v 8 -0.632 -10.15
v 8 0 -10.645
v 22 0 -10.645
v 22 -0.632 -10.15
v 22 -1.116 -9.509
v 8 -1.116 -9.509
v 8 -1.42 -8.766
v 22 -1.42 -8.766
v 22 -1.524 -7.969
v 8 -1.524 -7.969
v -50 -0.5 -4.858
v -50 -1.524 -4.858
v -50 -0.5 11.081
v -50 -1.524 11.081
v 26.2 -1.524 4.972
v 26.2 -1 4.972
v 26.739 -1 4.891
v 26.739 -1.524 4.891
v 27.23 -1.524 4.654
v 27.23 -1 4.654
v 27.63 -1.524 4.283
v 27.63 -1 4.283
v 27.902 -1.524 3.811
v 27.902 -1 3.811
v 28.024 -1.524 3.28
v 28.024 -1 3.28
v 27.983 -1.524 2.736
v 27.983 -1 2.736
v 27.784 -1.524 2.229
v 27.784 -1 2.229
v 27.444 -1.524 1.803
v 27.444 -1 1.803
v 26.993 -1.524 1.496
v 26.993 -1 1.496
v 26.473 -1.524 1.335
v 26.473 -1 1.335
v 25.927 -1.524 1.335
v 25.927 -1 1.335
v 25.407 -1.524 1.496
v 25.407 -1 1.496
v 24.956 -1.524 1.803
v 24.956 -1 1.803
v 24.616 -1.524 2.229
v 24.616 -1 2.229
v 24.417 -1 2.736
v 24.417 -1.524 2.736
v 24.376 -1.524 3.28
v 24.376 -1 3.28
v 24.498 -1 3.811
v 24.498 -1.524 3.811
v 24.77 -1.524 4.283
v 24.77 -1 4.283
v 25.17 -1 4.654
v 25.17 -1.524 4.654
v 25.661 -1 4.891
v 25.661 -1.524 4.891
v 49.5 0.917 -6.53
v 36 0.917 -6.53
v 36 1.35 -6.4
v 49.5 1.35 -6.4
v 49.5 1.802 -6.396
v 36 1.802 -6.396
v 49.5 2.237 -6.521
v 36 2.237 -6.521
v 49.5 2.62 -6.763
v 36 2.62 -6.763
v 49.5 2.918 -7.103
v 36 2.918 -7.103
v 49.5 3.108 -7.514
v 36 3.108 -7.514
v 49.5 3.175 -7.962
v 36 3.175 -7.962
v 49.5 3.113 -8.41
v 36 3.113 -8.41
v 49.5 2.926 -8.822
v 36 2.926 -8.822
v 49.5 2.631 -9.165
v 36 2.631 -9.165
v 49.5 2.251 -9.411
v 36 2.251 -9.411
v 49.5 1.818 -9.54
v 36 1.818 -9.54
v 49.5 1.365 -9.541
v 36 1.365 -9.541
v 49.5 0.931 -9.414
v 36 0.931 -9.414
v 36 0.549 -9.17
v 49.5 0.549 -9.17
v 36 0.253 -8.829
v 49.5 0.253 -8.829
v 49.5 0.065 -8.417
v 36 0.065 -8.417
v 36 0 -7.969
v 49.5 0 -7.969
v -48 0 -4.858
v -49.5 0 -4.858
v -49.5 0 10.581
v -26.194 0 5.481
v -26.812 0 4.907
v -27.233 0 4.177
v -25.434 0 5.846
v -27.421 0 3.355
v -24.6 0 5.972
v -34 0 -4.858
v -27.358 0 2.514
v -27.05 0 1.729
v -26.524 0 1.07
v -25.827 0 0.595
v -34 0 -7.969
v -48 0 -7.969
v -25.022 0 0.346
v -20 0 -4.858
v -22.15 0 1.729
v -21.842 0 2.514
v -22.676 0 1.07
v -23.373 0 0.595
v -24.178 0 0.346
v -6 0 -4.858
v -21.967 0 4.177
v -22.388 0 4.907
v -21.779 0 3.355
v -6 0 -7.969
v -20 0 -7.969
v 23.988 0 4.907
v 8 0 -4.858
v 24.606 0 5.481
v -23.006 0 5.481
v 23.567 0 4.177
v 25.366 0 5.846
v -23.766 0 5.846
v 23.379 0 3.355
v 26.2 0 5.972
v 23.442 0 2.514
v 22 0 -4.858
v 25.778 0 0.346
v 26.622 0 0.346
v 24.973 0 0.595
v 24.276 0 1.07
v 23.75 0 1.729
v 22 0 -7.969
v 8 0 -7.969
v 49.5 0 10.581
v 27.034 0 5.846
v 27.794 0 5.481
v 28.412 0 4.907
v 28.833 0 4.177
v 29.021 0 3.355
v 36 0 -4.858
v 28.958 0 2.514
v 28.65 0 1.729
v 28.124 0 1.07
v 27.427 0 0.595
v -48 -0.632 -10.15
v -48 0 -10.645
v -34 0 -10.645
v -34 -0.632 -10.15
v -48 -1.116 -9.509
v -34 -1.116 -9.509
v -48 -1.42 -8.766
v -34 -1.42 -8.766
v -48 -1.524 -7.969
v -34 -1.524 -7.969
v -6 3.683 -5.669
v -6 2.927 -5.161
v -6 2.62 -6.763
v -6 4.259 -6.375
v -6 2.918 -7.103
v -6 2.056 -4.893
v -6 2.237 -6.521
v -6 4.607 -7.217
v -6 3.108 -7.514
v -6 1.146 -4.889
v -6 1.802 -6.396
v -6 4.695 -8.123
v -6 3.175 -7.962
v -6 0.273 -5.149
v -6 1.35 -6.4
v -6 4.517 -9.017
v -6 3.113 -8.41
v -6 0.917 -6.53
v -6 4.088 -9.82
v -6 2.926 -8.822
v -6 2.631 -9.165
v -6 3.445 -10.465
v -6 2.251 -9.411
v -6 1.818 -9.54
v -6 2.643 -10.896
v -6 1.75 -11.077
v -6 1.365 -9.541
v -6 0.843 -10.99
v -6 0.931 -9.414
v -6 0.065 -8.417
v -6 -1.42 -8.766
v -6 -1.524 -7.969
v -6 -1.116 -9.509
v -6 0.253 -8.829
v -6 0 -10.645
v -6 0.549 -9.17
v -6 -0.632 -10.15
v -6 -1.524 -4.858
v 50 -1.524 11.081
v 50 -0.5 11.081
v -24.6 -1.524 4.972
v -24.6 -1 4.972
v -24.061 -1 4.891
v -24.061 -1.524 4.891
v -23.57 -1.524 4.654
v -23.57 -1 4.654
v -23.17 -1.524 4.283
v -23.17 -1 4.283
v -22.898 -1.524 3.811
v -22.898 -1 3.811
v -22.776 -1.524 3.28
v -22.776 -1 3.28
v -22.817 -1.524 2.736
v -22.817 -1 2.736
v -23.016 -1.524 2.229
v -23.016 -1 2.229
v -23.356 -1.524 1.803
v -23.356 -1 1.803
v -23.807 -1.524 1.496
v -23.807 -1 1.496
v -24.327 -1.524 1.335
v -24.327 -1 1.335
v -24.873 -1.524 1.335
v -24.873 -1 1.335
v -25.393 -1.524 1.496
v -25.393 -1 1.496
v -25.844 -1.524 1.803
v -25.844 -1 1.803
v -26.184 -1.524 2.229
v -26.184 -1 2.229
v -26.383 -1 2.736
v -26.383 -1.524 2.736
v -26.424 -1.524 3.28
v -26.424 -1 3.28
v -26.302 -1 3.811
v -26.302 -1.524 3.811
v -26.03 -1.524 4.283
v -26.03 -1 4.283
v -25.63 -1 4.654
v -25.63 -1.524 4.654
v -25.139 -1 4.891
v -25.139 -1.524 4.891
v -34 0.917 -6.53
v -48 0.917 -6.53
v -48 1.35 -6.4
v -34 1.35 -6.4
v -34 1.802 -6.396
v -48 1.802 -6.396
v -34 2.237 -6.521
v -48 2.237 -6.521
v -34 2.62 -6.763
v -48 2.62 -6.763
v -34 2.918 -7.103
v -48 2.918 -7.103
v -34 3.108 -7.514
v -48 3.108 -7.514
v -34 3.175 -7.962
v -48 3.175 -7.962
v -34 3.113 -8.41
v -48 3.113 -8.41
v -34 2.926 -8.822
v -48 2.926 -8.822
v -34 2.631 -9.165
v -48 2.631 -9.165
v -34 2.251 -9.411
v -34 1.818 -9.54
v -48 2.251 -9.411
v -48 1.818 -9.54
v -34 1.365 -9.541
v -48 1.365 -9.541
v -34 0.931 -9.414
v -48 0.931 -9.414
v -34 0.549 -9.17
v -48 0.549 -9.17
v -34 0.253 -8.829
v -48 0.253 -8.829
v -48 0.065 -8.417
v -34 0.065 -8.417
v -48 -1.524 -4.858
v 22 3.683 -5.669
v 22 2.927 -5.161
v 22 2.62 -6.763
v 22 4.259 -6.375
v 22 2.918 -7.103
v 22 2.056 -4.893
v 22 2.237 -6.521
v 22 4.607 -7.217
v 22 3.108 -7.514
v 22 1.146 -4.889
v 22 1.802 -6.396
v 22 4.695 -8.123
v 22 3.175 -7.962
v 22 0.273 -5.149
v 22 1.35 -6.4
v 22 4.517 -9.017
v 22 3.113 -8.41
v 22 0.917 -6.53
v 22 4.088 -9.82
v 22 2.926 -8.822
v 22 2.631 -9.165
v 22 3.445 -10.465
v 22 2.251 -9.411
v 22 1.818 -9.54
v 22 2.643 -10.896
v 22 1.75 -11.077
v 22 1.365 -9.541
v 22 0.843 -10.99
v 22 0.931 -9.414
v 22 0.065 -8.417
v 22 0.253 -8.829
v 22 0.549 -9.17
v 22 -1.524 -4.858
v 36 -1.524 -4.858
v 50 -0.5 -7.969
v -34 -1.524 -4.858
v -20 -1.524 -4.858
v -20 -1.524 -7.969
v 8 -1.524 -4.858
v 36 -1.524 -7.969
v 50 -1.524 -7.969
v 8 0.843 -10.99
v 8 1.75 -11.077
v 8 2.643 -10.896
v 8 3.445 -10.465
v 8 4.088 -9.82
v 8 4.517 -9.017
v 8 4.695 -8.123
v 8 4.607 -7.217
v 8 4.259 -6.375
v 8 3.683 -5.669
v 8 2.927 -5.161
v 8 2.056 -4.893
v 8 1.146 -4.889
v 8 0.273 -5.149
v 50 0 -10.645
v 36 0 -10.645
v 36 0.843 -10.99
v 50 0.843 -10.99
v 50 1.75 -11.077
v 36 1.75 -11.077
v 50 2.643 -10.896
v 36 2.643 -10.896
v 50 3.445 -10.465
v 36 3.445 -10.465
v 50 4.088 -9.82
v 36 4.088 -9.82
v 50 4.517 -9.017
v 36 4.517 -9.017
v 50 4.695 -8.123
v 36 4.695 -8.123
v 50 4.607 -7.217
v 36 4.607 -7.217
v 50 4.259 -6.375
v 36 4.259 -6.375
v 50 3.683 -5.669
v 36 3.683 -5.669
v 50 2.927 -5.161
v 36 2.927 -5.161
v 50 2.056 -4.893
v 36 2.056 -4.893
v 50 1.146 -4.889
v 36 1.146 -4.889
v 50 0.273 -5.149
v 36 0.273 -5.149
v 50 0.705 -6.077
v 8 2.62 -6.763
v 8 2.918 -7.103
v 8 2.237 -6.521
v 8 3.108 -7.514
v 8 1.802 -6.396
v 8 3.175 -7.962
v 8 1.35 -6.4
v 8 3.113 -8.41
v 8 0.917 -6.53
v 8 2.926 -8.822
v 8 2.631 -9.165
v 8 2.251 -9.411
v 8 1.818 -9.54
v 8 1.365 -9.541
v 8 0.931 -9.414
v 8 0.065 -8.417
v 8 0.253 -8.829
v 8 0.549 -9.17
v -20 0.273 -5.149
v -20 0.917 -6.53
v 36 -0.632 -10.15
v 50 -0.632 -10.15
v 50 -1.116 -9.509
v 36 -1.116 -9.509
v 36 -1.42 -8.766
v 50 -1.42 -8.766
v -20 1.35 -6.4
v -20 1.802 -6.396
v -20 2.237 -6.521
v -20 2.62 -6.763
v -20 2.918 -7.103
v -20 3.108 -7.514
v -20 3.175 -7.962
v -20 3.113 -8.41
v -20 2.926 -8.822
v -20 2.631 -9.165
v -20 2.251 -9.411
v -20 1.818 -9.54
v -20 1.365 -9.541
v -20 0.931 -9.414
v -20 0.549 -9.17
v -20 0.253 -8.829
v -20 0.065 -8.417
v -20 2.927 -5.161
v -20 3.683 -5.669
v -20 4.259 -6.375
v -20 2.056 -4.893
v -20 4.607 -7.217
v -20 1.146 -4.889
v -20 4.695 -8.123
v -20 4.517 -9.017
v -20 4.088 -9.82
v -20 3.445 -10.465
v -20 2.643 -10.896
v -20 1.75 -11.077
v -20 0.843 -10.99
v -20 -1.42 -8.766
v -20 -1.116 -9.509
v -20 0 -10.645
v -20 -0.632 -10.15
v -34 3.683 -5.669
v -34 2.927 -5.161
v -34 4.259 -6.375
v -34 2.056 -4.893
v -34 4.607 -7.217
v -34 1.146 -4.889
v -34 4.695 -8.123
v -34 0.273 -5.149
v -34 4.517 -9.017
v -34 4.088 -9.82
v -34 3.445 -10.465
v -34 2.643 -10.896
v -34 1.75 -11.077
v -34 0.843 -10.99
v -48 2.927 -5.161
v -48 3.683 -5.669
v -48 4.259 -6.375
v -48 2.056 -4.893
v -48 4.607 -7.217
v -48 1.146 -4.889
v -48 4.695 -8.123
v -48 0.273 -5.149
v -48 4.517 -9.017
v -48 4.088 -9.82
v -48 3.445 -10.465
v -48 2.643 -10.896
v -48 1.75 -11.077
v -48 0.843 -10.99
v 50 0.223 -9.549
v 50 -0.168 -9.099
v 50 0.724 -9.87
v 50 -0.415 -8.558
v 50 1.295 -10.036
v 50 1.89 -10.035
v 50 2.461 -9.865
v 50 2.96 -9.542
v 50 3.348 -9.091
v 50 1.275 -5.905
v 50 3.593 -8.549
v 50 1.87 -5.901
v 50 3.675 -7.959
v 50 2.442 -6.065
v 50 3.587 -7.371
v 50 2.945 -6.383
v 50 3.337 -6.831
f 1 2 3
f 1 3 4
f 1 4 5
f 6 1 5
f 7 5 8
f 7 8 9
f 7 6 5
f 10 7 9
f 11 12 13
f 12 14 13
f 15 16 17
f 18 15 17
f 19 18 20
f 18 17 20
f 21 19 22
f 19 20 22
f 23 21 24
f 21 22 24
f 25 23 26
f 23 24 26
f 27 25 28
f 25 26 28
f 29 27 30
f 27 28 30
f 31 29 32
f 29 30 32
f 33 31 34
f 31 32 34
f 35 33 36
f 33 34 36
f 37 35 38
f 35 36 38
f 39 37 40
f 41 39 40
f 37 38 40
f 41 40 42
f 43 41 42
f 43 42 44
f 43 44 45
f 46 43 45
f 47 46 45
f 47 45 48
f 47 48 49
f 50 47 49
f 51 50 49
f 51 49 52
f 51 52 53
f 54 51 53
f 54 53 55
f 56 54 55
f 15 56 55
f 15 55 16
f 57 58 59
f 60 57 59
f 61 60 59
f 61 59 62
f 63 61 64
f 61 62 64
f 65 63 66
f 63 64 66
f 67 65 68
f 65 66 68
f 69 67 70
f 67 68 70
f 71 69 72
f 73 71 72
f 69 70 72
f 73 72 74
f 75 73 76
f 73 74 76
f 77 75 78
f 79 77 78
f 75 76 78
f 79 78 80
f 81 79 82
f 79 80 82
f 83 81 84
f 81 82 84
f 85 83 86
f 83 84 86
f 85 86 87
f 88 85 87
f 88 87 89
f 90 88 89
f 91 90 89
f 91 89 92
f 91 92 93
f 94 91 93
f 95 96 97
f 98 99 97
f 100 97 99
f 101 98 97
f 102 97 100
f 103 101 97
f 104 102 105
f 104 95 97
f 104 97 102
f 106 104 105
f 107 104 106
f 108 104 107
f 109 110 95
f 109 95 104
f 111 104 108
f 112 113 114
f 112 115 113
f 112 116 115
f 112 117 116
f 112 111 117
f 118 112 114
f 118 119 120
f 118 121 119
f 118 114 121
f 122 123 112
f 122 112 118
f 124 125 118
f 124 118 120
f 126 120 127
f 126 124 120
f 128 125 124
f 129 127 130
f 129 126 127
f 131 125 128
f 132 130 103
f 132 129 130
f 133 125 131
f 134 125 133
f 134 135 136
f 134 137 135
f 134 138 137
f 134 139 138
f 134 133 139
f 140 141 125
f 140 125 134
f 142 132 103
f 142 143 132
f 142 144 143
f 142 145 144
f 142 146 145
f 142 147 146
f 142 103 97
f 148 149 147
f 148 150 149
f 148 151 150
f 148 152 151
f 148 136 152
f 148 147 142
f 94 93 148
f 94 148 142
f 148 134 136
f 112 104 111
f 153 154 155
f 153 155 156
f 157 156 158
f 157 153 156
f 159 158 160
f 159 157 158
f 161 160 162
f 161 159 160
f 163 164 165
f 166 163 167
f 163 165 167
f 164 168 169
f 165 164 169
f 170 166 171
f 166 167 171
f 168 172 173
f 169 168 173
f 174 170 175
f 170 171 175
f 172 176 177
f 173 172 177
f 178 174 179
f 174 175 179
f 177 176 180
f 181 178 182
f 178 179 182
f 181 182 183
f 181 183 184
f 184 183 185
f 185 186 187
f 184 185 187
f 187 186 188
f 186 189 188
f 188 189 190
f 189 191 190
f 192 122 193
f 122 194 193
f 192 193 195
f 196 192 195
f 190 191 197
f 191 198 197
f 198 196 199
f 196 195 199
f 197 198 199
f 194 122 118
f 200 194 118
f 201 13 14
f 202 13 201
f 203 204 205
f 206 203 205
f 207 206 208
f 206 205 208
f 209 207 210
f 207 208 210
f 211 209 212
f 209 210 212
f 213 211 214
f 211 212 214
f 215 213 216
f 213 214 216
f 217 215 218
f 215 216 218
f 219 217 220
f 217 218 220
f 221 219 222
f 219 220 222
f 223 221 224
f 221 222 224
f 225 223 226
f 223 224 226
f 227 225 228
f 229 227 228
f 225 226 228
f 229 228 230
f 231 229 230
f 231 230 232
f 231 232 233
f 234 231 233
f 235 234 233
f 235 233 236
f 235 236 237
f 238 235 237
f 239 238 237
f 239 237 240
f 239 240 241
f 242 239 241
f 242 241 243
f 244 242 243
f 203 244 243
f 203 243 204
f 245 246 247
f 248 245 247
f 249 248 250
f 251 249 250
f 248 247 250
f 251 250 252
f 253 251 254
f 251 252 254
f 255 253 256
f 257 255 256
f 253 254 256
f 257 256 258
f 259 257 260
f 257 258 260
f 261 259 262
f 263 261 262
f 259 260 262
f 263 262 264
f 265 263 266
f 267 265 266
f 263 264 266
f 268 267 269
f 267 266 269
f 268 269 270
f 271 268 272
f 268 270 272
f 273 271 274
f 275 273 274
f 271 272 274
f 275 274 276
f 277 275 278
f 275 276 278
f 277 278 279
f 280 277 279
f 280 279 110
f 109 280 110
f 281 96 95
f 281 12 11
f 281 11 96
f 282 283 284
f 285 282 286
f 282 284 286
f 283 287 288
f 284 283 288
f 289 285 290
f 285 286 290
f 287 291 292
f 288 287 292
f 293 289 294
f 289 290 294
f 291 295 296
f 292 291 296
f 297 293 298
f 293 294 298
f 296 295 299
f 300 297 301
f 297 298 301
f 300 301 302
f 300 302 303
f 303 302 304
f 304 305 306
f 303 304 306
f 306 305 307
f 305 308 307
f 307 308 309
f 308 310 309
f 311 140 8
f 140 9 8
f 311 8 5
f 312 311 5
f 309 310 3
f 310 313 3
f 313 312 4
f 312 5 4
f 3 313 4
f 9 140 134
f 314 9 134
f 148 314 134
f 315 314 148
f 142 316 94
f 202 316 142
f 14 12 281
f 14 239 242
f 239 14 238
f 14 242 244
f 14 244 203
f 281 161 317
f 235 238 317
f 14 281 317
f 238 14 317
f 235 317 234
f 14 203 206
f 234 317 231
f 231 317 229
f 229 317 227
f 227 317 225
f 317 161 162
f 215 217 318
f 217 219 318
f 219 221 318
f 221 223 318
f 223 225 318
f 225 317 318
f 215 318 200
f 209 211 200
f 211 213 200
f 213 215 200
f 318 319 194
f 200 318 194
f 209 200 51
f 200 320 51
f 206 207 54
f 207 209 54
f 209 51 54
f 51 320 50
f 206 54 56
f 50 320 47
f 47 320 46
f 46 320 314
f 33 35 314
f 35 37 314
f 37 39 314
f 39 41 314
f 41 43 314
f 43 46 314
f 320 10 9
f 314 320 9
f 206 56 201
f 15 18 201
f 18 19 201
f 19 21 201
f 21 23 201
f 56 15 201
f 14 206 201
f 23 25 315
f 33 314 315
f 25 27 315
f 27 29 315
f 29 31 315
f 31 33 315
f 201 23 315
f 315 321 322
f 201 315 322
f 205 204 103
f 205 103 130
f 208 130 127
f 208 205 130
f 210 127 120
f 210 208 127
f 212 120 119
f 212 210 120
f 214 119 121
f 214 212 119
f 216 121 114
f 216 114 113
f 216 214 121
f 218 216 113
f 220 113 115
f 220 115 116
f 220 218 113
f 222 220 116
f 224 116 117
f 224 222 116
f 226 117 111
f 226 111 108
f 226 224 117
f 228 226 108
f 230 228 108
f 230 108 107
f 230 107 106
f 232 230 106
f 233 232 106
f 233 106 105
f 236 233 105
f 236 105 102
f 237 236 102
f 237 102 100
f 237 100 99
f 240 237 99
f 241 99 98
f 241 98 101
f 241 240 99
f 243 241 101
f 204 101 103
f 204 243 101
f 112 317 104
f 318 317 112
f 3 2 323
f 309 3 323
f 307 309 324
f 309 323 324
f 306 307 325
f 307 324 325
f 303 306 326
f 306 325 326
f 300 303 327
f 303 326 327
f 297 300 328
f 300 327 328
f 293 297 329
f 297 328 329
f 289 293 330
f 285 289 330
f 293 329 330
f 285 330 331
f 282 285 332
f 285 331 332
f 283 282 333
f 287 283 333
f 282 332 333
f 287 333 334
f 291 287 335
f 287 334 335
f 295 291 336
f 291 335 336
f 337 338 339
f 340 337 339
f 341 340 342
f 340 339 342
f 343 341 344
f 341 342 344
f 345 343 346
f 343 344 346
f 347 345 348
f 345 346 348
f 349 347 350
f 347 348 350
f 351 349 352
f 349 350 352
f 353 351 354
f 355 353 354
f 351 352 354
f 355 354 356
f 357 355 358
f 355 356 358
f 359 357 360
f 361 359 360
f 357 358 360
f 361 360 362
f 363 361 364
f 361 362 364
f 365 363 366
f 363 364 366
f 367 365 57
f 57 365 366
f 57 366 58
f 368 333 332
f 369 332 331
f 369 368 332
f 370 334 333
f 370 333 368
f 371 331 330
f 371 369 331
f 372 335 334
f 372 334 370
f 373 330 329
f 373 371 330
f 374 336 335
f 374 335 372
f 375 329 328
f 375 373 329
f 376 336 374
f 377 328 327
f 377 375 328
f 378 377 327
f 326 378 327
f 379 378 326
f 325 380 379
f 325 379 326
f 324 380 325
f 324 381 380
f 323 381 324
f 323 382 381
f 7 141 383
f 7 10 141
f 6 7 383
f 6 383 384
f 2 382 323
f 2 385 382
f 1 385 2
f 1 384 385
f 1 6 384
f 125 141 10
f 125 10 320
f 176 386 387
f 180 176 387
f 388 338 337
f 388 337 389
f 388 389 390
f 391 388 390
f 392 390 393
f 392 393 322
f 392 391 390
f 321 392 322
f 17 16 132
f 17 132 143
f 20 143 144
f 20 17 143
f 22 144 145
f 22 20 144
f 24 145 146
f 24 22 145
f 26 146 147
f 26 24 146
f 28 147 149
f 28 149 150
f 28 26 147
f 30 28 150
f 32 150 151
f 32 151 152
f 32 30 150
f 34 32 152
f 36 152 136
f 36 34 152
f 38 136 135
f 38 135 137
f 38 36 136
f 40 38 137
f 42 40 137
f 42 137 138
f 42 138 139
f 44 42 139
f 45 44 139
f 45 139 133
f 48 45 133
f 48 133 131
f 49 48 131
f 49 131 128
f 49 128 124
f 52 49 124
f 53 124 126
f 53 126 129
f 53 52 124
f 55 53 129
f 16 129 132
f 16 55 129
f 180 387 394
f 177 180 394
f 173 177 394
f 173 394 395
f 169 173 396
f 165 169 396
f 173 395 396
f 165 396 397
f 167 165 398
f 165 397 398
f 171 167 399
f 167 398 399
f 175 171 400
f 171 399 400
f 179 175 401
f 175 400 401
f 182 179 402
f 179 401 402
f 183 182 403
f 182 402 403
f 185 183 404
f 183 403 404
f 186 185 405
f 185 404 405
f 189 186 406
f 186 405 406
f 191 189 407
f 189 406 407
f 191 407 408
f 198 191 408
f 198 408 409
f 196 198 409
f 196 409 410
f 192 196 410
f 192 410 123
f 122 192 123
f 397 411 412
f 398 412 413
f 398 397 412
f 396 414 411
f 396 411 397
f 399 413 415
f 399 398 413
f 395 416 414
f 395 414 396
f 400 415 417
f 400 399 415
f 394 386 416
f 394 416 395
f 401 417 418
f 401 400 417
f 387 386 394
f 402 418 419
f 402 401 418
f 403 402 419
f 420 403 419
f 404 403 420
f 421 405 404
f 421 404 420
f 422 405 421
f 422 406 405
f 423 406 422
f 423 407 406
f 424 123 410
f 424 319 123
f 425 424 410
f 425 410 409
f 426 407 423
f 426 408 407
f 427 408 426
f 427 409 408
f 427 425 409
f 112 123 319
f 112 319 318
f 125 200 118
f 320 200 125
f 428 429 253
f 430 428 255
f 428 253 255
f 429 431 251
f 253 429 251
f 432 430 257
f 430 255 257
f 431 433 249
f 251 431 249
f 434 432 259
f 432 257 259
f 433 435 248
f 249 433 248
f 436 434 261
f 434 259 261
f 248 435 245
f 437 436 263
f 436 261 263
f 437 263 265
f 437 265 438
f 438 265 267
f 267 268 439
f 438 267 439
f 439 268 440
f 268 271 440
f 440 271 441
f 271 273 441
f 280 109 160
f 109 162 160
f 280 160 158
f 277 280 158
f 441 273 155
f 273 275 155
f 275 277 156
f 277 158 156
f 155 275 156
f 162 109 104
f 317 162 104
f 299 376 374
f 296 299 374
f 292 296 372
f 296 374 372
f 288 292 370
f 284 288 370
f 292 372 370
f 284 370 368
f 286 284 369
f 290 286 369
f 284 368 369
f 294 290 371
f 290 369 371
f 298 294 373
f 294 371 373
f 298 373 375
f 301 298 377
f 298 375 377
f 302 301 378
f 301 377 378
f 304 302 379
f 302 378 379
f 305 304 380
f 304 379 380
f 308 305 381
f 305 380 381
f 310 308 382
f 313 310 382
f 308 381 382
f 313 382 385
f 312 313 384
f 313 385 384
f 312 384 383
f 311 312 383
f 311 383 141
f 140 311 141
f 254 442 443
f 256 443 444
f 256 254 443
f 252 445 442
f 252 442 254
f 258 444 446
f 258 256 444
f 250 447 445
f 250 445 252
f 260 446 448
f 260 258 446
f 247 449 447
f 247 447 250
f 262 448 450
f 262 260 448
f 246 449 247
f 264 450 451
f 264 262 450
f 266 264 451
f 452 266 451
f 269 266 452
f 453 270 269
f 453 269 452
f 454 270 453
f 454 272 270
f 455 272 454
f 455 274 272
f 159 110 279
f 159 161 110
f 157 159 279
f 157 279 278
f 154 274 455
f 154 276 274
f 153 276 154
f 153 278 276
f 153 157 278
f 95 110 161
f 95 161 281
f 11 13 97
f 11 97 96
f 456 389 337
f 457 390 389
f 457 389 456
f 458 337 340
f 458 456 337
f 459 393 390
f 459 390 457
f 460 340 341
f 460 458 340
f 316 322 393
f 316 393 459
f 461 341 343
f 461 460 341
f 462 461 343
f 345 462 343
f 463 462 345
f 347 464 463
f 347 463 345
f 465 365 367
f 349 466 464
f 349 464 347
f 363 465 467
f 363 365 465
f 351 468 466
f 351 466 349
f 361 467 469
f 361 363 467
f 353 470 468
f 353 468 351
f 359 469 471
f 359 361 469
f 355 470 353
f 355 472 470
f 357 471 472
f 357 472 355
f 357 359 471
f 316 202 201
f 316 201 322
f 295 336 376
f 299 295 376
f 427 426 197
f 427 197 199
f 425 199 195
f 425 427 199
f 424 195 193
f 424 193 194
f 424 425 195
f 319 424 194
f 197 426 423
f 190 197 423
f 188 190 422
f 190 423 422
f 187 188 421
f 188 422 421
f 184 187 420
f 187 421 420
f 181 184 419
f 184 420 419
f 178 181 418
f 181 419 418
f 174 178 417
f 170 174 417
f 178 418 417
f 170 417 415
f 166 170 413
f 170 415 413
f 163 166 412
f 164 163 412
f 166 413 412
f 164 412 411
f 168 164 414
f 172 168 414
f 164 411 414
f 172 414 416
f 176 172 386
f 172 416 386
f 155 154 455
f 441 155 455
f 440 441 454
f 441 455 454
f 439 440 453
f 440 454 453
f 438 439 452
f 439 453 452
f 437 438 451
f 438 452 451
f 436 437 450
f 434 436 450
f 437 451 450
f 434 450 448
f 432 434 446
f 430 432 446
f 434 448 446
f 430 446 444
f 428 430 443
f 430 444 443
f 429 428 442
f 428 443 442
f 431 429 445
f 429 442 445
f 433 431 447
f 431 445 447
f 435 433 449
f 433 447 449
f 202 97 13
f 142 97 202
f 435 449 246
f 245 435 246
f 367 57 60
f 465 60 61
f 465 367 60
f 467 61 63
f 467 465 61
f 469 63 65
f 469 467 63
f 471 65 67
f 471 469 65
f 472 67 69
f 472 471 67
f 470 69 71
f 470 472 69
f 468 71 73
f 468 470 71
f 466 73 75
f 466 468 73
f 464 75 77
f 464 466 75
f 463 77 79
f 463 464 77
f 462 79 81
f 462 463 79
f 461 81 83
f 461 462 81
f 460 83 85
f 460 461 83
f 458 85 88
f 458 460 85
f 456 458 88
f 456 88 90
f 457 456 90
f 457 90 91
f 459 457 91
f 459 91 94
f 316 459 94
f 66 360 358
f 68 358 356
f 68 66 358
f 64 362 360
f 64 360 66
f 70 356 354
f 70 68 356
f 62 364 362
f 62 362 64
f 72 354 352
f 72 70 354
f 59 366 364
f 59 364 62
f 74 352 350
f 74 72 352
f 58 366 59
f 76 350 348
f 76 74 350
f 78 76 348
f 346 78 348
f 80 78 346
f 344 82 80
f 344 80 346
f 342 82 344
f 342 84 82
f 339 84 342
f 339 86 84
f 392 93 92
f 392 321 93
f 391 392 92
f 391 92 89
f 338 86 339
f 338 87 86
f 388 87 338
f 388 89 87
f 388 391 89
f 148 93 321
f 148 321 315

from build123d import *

# Parameters (mm, degrees)
SKETCH1_W          = 100
SKETCH1_H          = 22.1615
BASE_FLANGE1_DEPTH = 1.524
HEM1_START         = -50
HEM1_DEPTH         = 100
HEM1_2_DEPTH       = 100
CUT_EXTRUDE1_START = -52.42823759
SKETCH8_W          = 14
SKETCH8_H          = 6.223
CUT_EXTRUDE1_DEPTH = 94.856475179
LPATTERN1_COUNT    = 11
LPATTERN1_PITCH    = 28
CHAMFER1_SIZE      = 0.5
SKETCH9_R          = 1.8288
CUT_EXTRUDE2_DEPTH = 10
LPATTERN2_COUNT    = 6
LPATTERN2_PITCH    = 50.8
CHAMFER2_SIZE      = 1


# Read off the part's stored shape, not the designer's step: Hem1
# Sheet-metal steps are written as plain solids
with BuildPart() as part:
    # Sketch1 → Base-Flange1 (new body)
    with BuildSketch(Plane(origin=(0, 0, 0), x_dir=(1, 0, 0), z_dir=(0, 1, 0))):
        Rectangle(SKETCH1_W, SKETCH1_H)
    extrude(amount=-BASE_FLANGE1_DEPTH)

    # Hem1 outline → Hem1 (cut)
    with BuildSketch(Plane.YZ.offset(HEM1_START)):
        with BuildLine():
            Line((0, -11.08075), (0, -10.645306054))
            ThreePointArc((0, -10.645306054), (-1.116287945, -9.509043168), (-1.524, -7.96925))
            Line((-1.524, -7.96925), (-1.524, -11.08075))
            Line((-1.524, -11.08075), (0, -11.08075))
        make_face()
    extrude(amount=HEM1_DEPTH, mode=Mode.SUBTRACT)

    # Hem1 2 outline → Hem1 2 (add)
    with BuildSketch(Plane.YZ.offset(HEM1_START)):
        with BuildLine():
            Line((0.272523279, -5.149273321), (0.916593509, -6.530486388))
            ThreePointArc((0.916593509, -6.530486388), (2.92638392, -8.822213128), (0, -7.96925))
            Line((0, -7.96925), (0, -10.645306054))
            ThreePointArc((0, -10.645306054), (4.69518189, -8.123345818), (0.272523279, -5.149273321))
        make_face()
    extrude(amount=HEM1_2_DEPTH)

    # Sketch8 → Cut-Extrude1 (cut)
    with BuildSketch(Plane(origin=(0, 0, 0), x_dir=(1, 0, 0), z_dir=(0, 1, 0)).offset(CUT_EXTRUDE1_START)):
        with Locations((29, 7.96925)):
            Rectangle(SKETCH8_W, SKETCH8_H)
    cut_extrude1 = extrude(amount=CUT_EXTRUDE1_DEPTH, mode=Mode.SUBTRACT)

    # LPattern1: Cut-Extrude1 ×11
    with Locations(*[(-i * LPATTERN1_PITCH, 0, 0) for i in range(1, LPATTERN1_COUNT)]):
        add(cut_extrude1, mode=Mode.SUBTRACT)

    # Chamfer1
    chamfer1_edges = [part.edges().sort_by_distance(p)[0] for p in [
        (-50, 0, 3.1115),
        (50, 2.92638392, -8.822213128),
        (0, 0, 11.08075),
        (50, 0, 1.55575),
    ]]
    chamfer(chamfer1_edges, length=CHAMFER1_SIZE)

    # Sketch9 → Cut-Extrude2 (cut)
    with BuildSketch(Plane(origin=(0, 0, 0), x_dir=(1, 0, 0), z_dir=(0, 1, 0))):
        with Locations(Location((-24.6, -3.14325, 0), (0, 0, 270))):
            Circle(SKETCH9_R)
    cut_extrude2 = extrude(amount=-CUT_EXTRUDE2_DEPTH, mode=Mode.SUBTRACT)

    # LPattern2: Cut-Extrude2 ×6
    with Locations(*[(i * LPATTERN2_PITCH, 0, 0) for i in range(1, LPATTERN2_COUNT)]):
        add(cut_extrude2, mode=Mode.SUBTRACT)

    # Chamfer2
    chamfer2_edges = [part.edges().sort_by_distance(p)[0] for p in [
        (-24.6, 0, 1.31445),
        (26.2, 0, 1.31445),
    ]]
    chamfer(chamfer2_edges, length=CHAMFER2_SIZE)


solid = part.part
